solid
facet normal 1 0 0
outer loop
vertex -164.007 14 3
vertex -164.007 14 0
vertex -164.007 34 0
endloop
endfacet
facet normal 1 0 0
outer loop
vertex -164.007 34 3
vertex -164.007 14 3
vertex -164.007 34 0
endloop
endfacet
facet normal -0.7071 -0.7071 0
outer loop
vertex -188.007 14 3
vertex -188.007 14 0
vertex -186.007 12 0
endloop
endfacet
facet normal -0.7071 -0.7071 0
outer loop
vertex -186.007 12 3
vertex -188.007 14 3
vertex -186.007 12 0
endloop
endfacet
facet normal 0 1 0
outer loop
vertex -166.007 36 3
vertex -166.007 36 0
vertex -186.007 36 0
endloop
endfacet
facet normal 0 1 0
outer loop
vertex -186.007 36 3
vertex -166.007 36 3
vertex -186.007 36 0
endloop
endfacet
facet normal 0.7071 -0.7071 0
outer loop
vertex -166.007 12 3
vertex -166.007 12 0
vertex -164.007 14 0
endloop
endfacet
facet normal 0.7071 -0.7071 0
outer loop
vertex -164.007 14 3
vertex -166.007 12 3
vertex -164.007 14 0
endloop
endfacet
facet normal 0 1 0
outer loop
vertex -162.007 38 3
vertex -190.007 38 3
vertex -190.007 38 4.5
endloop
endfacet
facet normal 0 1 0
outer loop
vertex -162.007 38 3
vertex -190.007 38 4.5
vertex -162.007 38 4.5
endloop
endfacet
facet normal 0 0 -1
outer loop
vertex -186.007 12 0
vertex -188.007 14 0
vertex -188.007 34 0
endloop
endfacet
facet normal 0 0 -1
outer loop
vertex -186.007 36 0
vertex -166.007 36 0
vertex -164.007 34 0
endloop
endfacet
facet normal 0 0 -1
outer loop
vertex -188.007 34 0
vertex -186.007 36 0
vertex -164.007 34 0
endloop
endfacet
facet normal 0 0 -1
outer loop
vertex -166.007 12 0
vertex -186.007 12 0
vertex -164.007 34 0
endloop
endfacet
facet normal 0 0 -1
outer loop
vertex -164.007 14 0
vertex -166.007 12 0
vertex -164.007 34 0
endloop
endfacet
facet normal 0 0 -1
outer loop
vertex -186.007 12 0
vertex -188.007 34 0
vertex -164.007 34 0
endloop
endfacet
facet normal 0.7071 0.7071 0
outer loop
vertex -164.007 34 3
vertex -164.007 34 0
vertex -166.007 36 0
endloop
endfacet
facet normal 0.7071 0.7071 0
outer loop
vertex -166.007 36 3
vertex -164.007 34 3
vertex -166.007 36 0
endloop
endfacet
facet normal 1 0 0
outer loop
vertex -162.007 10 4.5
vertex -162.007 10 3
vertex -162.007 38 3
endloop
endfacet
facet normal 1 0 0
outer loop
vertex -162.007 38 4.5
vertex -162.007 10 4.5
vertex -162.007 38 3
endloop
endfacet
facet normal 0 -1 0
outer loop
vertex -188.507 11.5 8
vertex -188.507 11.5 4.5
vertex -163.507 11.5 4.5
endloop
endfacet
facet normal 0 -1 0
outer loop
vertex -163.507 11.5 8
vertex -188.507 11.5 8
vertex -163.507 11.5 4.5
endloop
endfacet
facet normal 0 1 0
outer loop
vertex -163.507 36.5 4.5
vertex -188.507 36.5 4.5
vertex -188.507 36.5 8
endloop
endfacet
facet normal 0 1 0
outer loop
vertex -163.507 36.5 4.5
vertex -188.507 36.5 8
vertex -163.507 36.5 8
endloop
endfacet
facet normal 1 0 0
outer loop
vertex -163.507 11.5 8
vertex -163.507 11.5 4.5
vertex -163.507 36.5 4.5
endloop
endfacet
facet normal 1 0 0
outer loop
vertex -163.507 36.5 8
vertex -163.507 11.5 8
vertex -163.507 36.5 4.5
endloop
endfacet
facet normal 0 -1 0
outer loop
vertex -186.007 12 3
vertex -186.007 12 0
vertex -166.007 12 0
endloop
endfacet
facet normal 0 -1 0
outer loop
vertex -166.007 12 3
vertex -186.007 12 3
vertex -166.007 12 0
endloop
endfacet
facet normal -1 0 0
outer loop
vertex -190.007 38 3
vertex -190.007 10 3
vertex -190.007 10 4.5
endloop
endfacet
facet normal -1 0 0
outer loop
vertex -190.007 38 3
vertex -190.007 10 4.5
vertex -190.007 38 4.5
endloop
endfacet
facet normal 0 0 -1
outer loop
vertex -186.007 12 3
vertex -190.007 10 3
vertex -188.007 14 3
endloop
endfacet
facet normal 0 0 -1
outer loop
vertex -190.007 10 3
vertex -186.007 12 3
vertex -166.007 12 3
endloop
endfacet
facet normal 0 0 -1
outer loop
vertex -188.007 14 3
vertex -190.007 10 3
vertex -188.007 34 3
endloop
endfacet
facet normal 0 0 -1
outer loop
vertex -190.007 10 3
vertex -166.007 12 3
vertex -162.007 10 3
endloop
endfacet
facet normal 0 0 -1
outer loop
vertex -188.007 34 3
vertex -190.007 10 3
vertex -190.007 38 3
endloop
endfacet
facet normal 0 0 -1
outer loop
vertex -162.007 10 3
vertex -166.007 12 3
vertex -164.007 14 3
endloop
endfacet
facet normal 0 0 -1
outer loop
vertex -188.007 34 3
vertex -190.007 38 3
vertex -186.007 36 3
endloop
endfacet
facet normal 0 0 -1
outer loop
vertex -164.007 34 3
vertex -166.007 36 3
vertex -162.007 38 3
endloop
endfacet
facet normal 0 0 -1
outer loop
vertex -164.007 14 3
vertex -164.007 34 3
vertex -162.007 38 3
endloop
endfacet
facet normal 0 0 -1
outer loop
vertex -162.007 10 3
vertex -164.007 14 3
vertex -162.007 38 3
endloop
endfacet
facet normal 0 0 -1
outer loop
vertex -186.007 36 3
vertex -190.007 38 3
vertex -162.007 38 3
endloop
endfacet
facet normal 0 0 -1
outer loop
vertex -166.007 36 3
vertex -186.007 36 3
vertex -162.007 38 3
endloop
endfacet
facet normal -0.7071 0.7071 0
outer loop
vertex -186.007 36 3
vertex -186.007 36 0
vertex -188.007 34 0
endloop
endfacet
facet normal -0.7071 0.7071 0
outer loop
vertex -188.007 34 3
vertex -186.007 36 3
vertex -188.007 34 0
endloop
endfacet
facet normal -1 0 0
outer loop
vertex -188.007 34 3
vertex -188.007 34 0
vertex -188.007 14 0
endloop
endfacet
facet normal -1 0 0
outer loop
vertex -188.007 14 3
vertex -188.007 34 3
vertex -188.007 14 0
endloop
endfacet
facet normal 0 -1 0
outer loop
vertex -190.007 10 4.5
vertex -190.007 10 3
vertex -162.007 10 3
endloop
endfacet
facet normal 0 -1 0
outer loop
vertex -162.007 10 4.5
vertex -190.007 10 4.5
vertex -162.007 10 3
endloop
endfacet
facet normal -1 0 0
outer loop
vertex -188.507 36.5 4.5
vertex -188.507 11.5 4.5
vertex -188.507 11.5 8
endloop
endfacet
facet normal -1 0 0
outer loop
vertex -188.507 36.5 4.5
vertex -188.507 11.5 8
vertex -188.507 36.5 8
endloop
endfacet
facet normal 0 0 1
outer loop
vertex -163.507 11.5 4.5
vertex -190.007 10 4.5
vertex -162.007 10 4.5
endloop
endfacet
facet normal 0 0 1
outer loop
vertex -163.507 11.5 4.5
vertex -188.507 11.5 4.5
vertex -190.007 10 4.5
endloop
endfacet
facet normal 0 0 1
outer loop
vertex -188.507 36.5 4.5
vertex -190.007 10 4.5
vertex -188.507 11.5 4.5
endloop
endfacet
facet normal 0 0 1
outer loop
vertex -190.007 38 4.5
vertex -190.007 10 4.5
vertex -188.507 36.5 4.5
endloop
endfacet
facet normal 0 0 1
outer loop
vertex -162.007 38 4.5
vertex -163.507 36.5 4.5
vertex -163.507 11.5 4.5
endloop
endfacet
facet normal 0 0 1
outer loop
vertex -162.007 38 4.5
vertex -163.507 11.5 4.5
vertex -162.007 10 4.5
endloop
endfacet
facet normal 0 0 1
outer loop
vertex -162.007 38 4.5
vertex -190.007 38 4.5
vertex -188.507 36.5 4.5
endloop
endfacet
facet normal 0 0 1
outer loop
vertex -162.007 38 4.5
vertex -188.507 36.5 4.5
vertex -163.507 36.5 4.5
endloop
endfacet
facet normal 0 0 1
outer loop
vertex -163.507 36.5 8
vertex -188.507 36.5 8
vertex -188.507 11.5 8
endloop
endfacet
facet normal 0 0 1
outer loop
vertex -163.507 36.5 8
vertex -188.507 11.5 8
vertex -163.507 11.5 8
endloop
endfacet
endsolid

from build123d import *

# Parameters (mm, degrees)
BOSS_EXTRUDE1_DEPTH = 3
SKETCH2_W           = 28
SKETCH2_H           = 28
BOSS_EXTRUDE2_DEPTH = 1.5
SKETCH3_W           = 25
SKETCH3_H           = 25
BOSS_EXTRUDE3_DEPTH = 3.5


with BuildPart() as part:
    # Sketch1 → Boss-Extrude1 (new body)
    with BuildSketch(Plane.XY):
        Polygon((-166.007283518, 36), (-186.007283518, 36), (-188.007283518, 34), (-188.007283518, 14), (-186.007283518, 12), (-166.007283518, 12), (-164.007283518, 14), (-164.007283518, 34), align=None)
    extrude(amount=BOSS_EXTRUDE1_DEPTH)

    # Sketch2 → Boss-Extrude2 (add)
    with BuildSketch(Plane.XY.offset(3)):
        with Locations((-176.007283518, 24)):
            Rectangle(SKETCH2_W, SKETCH2_H)
    extrude(amount=BOSS_EXTRUDE2_DEPTH)

    # Sketch3 → Boss-Extrude3 (add)
    with BuildSketch(Plane.XY.offset(4.5)):
        with Locations((-176.007283518, 24)):
            Rectangle(SKETCH3_W, SKETCH3_H)
    extrude(amount=BOSS_EXTRUDE3_DEPTH)


solid = part.part
